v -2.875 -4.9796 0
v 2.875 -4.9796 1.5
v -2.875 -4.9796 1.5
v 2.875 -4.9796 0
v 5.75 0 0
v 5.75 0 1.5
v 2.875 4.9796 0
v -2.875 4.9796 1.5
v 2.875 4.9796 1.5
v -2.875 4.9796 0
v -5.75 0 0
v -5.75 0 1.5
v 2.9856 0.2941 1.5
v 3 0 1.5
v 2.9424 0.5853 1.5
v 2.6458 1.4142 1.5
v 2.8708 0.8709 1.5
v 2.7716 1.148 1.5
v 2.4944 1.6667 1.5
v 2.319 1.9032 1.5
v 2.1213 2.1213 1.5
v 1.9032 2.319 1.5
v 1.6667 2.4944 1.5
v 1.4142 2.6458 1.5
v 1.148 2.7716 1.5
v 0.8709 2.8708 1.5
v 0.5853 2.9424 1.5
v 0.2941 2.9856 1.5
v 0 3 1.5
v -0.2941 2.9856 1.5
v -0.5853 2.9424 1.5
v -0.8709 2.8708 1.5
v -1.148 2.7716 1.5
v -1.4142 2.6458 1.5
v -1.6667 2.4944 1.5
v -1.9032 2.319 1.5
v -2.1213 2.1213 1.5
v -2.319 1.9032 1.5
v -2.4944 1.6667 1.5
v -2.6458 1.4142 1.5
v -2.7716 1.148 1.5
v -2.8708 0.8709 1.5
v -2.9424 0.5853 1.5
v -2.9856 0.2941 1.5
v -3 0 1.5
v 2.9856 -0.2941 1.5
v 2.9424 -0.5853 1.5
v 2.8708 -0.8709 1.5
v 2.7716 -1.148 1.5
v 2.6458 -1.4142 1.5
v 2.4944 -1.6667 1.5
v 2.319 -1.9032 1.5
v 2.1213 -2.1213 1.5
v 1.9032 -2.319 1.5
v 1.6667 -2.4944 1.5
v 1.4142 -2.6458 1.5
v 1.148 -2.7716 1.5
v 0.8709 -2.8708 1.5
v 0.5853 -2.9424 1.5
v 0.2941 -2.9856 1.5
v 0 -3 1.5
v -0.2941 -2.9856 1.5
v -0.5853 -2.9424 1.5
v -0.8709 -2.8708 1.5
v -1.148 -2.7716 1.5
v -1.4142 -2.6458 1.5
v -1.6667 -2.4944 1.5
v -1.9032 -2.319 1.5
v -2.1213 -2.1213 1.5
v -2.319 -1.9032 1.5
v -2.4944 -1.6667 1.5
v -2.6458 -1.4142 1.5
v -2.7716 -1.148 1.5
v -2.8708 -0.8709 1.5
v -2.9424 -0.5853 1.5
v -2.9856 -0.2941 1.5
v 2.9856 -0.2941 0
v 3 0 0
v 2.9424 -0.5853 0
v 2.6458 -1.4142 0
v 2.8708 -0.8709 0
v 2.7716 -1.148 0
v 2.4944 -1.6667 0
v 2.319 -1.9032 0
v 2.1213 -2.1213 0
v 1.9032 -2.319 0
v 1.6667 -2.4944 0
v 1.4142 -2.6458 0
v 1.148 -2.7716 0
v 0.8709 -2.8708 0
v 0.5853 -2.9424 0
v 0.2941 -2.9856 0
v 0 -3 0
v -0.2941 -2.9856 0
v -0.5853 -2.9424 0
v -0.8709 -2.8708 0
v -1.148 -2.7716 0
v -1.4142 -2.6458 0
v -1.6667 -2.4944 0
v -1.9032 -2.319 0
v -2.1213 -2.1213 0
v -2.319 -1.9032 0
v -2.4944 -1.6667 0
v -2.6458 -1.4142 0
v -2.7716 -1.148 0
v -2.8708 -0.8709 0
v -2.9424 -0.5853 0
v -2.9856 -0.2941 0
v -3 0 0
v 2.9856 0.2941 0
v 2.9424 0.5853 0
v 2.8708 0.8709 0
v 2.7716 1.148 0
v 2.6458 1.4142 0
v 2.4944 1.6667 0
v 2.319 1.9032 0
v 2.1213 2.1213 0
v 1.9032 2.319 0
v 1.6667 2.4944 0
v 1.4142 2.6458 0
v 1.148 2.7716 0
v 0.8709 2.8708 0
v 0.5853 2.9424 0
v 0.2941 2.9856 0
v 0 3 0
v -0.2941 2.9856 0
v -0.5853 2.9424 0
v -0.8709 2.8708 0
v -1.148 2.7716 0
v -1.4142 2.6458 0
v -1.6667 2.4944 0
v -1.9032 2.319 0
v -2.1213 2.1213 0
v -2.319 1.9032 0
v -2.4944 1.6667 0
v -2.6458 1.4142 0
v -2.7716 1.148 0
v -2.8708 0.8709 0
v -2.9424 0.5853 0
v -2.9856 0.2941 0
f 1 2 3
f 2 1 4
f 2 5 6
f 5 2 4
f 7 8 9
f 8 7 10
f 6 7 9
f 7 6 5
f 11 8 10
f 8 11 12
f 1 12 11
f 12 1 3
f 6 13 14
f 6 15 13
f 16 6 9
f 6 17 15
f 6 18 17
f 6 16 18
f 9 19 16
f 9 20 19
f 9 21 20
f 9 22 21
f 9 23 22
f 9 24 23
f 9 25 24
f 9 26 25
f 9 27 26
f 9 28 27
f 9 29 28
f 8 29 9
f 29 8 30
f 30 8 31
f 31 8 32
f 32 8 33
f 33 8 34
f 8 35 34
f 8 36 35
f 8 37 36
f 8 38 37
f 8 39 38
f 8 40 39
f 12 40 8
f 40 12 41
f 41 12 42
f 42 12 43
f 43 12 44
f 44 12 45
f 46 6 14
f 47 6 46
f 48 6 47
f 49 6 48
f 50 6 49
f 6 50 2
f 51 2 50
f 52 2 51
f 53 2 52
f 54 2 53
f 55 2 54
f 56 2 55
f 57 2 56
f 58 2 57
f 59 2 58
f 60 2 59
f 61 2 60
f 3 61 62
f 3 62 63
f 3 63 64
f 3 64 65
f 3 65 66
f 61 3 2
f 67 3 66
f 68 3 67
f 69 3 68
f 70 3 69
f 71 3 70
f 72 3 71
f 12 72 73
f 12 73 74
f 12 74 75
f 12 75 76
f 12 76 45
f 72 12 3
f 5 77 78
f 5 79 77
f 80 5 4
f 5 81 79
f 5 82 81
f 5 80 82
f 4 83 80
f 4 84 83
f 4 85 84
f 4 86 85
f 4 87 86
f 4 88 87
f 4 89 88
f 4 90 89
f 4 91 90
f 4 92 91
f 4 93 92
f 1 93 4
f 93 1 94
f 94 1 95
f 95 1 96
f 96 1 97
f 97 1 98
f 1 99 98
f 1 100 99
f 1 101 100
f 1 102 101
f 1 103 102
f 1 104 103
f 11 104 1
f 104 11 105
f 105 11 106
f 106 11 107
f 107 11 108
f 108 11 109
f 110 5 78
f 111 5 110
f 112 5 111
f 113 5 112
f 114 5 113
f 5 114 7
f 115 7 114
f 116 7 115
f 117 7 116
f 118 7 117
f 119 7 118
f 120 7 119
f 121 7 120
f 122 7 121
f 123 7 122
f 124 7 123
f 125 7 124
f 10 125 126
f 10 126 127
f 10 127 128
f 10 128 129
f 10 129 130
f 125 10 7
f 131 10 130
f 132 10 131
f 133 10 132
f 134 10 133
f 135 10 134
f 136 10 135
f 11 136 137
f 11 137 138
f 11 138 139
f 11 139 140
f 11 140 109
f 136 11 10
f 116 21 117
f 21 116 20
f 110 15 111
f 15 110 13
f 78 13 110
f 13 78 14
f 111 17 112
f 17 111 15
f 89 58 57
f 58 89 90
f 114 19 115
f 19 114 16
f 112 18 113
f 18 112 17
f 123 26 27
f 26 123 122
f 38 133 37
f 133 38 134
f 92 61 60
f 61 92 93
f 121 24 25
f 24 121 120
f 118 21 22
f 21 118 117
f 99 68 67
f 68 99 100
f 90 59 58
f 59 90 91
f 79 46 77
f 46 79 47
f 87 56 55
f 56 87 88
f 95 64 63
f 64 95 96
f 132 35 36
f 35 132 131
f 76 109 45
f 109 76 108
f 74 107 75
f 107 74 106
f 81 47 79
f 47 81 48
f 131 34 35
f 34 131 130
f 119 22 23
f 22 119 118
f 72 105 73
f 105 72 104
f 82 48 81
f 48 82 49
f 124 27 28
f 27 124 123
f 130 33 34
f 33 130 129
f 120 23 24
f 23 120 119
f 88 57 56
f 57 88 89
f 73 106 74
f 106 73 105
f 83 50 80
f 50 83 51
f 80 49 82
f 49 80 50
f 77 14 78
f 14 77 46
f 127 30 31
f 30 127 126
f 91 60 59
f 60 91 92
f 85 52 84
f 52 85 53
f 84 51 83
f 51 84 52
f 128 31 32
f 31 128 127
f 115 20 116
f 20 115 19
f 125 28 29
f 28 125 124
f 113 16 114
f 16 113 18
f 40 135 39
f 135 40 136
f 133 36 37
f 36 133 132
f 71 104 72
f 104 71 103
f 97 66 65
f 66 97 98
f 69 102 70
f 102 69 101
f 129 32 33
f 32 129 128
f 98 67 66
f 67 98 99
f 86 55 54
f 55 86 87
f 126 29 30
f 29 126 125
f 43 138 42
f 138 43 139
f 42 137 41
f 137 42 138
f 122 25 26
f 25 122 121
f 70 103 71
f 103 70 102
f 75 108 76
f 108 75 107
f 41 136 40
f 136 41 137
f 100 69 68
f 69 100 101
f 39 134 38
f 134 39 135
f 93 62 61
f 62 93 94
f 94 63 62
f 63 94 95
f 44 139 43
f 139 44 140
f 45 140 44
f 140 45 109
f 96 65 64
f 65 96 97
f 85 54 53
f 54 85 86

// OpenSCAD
module hex_nut() {
    difference() {
        // Hexagon shape
        scale([1, 1, 0.5])
            cylinder(d=11.5, h=3.0, $fn=6);
        // Central hole for 6.0mm screw
        translate([0, 0, -1])
            cylinder(d=6.0, h=5.0, $fn=64);
    }
}

hex_nut();
